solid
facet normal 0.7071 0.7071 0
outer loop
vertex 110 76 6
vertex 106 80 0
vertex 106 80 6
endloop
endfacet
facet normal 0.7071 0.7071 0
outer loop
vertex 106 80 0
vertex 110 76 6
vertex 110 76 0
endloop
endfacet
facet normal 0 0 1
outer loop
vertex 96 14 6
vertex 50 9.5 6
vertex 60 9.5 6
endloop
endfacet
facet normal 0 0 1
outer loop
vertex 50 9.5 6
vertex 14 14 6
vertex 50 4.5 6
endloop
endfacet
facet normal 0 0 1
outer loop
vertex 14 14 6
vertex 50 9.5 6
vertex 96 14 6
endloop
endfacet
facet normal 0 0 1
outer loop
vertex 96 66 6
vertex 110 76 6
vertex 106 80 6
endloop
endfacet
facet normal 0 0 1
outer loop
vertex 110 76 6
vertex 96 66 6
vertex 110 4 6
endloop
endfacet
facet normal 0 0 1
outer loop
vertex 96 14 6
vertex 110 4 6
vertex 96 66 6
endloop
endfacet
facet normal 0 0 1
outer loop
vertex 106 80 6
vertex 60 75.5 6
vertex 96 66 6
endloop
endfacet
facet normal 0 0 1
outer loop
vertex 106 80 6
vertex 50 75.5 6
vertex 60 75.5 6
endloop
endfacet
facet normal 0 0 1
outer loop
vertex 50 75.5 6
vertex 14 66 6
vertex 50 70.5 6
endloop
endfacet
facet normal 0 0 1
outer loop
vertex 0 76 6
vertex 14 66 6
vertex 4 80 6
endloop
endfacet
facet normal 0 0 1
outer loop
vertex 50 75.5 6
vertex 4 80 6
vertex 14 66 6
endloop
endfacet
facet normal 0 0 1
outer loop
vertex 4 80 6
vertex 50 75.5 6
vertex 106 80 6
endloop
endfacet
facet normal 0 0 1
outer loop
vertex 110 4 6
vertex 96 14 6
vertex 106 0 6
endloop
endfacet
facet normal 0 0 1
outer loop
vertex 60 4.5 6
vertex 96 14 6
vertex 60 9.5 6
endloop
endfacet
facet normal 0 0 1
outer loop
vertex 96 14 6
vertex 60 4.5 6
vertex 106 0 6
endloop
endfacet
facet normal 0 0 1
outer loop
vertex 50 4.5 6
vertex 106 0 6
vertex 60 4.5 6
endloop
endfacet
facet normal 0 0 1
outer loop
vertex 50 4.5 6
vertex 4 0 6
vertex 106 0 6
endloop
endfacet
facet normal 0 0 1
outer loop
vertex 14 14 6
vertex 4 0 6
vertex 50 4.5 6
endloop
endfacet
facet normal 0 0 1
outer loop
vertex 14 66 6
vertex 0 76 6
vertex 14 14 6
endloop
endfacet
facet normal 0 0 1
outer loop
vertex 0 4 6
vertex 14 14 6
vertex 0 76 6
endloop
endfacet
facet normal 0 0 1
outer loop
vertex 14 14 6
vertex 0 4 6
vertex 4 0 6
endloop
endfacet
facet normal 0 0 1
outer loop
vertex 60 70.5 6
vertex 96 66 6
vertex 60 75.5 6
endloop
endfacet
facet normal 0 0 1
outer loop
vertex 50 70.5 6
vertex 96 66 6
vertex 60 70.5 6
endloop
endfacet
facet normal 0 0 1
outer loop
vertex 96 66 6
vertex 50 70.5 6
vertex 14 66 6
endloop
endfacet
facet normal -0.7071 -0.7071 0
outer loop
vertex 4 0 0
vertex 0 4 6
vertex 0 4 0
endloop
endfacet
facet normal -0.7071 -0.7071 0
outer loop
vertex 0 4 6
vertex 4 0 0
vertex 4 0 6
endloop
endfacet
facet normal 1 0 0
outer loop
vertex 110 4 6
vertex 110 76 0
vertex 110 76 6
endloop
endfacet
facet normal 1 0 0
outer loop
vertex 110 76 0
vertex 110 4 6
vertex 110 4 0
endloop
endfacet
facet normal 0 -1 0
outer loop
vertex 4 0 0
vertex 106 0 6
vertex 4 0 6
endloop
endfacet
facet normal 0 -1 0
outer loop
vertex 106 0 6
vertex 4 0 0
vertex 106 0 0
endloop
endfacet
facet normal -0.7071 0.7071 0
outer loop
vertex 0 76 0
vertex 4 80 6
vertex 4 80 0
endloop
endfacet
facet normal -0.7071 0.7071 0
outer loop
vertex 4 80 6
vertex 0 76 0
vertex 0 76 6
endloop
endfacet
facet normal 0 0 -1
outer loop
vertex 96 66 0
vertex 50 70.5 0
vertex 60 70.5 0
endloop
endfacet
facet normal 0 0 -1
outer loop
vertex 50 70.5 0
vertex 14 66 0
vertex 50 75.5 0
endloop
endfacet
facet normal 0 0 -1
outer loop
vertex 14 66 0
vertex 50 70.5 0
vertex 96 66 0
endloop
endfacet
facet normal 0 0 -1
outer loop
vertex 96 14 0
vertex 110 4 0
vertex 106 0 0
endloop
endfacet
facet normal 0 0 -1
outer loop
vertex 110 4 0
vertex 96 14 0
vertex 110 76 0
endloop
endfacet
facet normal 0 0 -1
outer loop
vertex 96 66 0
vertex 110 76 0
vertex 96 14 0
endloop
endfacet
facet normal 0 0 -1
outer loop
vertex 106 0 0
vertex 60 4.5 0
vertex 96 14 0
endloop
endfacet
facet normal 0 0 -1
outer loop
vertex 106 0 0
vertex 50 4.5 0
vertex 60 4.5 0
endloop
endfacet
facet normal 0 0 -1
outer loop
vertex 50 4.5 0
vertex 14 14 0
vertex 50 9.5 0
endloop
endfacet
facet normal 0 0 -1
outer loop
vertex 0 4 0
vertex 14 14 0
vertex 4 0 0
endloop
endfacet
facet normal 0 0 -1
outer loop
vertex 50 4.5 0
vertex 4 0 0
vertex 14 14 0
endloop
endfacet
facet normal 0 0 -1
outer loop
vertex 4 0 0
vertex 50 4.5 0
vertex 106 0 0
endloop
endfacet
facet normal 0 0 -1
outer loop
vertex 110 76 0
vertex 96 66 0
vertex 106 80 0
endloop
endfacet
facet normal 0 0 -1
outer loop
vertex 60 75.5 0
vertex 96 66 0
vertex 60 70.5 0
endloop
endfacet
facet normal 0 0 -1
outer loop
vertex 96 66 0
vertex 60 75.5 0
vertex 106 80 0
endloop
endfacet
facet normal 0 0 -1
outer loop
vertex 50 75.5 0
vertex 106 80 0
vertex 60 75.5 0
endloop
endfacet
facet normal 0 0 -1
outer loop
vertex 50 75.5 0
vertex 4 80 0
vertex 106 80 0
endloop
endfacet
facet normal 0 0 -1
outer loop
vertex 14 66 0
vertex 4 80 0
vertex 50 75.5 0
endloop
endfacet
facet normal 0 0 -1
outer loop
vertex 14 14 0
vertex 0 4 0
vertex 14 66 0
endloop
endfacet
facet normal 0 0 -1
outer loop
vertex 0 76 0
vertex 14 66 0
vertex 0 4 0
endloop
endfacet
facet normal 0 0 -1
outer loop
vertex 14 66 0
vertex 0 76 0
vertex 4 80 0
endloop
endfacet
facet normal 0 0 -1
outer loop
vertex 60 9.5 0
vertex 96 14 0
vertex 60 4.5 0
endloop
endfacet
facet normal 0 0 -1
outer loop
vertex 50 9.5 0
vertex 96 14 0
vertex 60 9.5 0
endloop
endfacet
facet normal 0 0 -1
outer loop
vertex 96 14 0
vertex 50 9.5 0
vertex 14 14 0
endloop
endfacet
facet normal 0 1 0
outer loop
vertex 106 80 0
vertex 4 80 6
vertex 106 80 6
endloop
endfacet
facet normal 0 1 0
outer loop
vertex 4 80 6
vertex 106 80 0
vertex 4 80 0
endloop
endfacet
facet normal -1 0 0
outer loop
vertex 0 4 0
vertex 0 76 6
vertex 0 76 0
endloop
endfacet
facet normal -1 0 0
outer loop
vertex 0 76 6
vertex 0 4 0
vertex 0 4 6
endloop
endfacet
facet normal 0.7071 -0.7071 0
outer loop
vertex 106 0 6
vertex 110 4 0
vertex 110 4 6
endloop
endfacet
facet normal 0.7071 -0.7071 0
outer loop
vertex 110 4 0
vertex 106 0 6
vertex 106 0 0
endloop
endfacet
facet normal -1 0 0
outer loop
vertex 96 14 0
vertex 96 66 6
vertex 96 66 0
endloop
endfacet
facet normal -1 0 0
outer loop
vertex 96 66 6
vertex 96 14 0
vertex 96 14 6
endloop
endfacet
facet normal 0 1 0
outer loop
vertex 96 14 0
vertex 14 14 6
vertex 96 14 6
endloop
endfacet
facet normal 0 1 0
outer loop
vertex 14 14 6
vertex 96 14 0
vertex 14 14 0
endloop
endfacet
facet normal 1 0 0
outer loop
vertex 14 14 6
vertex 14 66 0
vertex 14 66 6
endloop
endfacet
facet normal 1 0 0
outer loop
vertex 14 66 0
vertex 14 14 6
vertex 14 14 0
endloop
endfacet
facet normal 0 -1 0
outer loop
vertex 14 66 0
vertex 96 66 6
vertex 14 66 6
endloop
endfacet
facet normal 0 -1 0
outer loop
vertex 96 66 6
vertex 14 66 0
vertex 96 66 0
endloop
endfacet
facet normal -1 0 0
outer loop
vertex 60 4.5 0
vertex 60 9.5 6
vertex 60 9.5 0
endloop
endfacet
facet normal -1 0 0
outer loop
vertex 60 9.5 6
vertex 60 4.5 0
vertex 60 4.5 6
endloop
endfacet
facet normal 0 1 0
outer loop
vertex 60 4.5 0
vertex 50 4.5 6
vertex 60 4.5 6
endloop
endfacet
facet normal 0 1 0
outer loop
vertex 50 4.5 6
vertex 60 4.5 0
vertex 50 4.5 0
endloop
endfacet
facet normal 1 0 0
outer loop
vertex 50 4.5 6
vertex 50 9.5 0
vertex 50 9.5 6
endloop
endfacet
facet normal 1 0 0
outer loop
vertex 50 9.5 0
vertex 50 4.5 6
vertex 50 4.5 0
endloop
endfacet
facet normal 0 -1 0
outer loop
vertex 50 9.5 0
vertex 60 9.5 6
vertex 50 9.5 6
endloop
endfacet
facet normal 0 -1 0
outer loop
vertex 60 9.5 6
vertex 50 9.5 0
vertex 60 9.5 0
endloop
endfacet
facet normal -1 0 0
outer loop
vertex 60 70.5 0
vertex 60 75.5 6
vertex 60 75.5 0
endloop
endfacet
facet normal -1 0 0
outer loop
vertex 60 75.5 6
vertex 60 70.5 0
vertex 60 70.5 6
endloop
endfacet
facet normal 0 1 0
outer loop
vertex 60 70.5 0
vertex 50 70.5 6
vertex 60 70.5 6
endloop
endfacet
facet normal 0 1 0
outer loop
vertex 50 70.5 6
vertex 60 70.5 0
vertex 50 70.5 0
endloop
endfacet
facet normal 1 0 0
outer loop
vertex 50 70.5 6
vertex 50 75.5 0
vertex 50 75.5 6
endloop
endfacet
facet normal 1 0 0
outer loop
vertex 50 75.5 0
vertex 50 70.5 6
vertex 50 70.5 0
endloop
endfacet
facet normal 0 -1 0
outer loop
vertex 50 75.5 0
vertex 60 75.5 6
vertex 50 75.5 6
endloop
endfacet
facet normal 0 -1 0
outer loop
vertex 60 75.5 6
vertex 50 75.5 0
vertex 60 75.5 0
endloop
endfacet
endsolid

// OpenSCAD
$fn = 32;

// ----------------------------------------------------------------------
// Frame plate: 110 x 80 frame, 14 mm rails
// ----------------------------------------------------------------------

// --- parameters (mm) ---
plate_l = 110;            // plate length, X
plate_w = 80;             // plate width, Y
plate_t = 6;              // plate thickness, Z (extrusion height)
corner_c = 4;             // corner chamfer
frame_bar = 14;           // frame rail width
slot_l = 10;              // adjustment slot length
slot_w = 5;               // adjustment slot width

win_l = plate_l - 2 * frame_bar;  // window length
win_w = plate_w - 2 * frame_bar;  // window width

profile = [[4, 0], [106, 0], [110, 4], [110, 76], [106, 80], [4, 80], [0, 76], [0, 4]];  // primary outline, 8 points, counter clockwise
void_1 = [[14, 14], [96, 14], [96, 66], [14, 66]];  // the window, 4 points
void_2 = [[50, 4.5], [60, 4.5], [60, 9.5], [50, 9.5]];  // adjustment slot, 4 points
void_3 = [[50, 70.5], [60, 70.5], [60, 75.5], [50, 75.5]];  // adjustment slot, 4 points

// --- the one profile operation ---
difference() {
  linear_extrude(height = plate_t) polygon(points = profile);
  translate([0, 0, -1])
    linear_extrude(height = plate_t + 2) polygon(points = void_1);
  translate([0, 0, -1])
    linear_extrude(height = plate_t + 2) polygon(points = void_2);
  translate([0, 0, -1])
    linear_extrude(height = plate_t + 2) polygon(points = void_3);
}
